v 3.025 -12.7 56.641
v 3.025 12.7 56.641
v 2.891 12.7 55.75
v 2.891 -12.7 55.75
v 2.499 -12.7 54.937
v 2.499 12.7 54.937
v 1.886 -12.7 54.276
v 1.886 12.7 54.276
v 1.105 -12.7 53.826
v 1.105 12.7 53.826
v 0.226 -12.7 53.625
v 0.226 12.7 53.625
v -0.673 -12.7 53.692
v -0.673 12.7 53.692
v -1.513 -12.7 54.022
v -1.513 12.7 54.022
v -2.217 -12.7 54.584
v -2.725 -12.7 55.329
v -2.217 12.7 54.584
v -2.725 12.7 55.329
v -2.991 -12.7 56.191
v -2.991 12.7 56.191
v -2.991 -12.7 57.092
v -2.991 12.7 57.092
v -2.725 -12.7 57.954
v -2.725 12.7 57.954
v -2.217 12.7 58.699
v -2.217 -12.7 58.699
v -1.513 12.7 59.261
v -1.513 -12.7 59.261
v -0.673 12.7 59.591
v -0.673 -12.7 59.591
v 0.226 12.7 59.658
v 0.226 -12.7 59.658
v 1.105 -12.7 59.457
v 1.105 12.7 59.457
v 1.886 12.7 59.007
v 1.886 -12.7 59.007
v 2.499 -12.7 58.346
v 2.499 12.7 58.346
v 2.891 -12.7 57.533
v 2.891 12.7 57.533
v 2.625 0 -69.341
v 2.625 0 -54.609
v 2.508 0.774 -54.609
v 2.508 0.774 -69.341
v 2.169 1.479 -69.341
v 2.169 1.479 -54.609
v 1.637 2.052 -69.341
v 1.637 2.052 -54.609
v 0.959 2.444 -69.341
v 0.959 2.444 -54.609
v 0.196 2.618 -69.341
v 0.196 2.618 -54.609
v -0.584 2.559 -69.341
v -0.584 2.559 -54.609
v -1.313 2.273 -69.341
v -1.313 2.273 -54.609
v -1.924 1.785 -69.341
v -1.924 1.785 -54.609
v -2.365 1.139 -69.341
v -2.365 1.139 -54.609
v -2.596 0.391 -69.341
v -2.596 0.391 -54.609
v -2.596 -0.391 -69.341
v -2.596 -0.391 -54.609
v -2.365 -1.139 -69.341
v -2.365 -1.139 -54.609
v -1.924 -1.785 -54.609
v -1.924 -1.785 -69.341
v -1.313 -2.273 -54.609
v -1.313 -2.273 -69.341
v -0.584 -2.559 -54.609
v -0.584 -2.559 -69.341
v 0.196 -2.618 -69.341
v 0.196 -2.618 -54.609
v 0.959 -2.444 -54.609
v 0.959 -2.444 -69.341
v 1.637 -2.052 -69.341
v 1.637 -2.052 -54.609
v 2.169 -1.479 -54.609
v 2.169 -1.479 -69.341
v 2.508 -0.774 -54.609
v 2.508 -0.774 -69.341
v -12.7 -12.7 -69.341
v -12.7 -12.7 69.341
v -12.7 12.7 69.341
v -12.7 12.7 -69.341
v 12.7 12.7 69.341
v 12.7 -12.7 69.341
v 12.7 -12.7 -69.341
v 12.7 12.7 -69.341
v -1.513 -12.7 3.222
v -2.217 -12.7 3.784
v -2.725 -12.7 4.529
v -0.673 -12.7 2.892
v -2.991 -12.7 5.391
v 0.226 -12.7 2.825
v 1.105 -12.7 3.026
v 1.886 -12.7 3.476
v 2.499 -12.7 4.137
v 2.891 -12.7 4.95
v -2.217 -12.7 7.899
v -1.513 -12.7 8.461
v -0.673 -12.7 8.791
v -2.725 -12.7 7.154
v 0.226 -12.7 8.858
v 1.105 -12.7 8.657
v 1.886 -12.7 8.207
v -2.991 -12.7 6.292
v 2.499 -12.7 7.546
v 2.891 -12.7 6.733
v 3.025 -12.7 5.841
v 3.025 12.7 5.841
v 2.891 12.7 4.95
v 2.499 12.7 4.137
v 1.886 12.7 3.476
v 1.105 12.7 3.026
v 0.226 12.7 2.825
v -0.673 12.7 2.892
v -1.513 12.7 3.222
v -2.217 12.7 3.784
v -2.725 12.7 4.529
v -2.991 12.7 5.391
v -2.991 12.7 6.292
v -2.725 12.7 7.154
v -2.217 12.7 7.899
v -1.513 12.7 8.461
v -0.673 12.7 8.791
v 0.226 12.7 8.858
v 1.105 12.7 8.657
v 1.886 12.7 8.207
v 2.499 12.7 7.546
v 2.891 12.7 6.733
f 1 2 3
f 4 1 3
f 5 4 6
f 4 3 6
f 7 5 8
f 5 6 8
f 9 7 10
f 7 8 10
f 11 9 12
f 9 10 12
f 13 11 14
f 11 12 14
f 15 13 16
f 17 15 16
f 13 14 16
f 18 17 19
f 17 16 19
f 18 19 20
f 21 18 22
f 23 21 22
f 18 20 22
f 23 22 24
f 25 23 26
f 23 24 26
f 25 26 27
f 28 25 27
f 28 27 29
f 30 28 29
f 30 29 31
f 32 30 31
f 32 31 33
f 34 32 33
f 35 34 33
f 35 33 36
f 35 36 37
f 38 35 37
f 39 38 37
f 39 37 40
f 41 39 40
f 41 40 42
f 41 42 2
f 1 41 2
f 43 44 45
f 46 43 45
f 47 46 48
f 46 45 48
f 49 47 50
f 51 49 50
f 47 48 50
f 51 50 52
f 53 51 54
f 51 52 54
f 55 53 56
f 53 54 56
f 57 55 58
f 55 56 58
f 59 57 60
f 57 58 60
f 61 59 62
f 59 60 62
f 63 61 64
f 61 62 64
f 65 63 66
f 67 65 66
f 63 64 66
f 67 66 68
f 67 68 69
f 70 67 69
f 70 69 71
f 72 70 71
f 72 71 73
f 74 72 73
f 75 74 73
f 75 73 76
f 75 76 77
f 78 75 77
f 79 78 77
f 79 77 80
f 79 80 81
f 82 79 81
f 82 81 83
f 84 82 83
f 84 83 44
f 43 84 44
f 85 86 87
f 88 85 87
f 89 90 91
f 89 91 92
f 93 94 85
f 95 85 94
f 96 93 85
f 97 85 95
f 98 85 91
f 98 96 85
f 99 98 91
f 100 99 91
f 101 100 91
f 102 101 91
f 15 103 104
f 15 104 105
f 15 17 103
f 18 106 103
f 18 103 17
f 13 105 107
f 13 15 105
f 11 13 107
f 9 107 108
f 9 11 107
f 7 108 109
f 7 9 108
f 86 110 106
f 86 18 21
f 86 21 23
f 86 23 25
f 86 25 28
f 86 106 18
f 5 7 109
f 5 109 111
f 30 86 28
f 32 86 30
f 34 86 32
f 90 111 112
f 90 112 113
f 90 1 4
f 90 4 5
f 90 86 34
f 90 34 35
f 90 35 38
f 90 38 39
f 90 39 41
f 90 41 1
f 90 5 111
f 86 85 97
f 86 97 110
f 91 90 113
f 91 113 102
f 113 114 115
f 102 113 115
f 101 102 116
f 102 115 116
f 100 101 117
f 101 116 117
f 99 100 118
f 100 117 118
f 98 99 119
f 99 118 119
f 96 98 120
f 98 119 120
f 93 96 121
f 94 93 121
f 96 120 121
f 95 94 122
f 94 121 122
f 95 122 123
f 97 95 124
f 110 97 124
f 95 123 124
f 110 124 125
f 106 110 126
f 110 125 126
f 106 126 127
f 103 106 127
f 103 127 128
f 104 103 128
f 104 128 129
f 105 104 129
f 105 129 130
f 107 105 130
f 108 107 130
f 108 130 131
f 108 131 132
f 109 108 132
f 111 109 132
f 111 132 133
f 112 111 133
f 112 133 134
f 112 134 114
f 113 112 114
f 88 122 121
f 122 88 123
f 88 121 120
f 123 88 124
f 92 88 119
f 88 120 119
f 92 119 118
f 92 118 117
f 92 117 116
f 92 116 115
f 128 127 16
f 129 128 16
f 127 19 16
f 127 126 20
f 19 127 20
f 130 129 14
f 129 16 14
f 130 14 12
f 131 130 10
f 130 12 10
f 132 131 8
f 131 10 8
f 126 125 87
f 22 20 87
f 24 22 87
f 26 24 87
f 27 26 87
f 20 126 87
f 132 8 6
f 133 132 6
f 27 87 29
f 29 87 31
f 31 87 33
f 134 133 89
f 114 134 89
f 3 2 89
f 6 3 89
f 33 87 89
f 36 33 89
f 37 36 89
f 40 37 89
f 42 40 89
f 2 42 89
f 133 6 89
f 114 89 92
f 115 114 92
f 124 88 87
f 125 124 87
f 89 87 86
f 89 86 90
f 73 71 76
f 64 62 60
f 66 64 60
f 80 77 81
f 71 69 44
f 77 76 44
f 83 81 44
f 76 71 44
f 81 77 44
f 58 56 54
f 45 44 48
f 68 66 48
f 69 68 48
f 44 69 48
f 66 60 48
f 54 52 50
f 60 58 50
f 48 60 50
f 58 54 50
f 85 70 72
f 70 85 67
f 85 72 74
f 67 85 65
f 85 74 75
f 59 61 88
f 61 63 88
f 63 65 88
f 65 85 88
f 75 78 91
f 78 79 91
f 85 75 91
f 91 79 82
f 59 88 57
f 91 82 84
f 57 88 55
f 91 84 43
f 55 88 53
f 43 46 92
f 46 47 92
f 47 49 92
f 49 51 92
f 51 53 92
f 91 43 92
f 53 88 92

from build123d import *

# Parameters (mm, degrees)
SKETCH1_W                        = 25.4
SKETCH1_H                        = 25.4
BOSS_EXTRUDE1_DEPTH              = 69.341499747
F_6_05_6_05_DIAMETER_HOLE1_D     = 6.05
TAP_DRILL_FOR_M6X0_75_TAP1_D     = 5.25
TAP_DRILL_FOR_M6X0_75_TAP1_DEPTH = 14.732


with BuildPart() as part:
    # Sketch1 → Boss-Extrude1 (new body, symmetric)
    with BuildSketch(Plane.XY):
        Rectangle(SKETCH1_W, SKETCH1_H)
    extrude(amount=BOSS_EXTRUDE1_DEPTH, both=True)

    # Ø6.05 (6.05) Diameter Hole1 (through all)
    with Locations(Plane(origin=(0, -12.7, 0), x_dir=(-1, 0, 0), z_dir=(0, -1, 0))):
        with Locations((0, -5.841499747), (0, -56.641499747)):
            Hole(F_6_05_6_05_DIAMETER_HOLE1_D / 2)

    # Tap Drill for M6x0.75 Tap1
    with Locations(Plane(origin=(0, 0, -69.341499747), x_dir=(-1, 0, 0), z_dir=(0, 0, -1))):
        with Locations((0, 0)):
            Hole(TAP_DRILL_FOR_M6X0_75_TAP1_D / 2, depth=TAP_DRILL_FOR_M6X0_75_TAP1_DEPTH)


solid = part.part
